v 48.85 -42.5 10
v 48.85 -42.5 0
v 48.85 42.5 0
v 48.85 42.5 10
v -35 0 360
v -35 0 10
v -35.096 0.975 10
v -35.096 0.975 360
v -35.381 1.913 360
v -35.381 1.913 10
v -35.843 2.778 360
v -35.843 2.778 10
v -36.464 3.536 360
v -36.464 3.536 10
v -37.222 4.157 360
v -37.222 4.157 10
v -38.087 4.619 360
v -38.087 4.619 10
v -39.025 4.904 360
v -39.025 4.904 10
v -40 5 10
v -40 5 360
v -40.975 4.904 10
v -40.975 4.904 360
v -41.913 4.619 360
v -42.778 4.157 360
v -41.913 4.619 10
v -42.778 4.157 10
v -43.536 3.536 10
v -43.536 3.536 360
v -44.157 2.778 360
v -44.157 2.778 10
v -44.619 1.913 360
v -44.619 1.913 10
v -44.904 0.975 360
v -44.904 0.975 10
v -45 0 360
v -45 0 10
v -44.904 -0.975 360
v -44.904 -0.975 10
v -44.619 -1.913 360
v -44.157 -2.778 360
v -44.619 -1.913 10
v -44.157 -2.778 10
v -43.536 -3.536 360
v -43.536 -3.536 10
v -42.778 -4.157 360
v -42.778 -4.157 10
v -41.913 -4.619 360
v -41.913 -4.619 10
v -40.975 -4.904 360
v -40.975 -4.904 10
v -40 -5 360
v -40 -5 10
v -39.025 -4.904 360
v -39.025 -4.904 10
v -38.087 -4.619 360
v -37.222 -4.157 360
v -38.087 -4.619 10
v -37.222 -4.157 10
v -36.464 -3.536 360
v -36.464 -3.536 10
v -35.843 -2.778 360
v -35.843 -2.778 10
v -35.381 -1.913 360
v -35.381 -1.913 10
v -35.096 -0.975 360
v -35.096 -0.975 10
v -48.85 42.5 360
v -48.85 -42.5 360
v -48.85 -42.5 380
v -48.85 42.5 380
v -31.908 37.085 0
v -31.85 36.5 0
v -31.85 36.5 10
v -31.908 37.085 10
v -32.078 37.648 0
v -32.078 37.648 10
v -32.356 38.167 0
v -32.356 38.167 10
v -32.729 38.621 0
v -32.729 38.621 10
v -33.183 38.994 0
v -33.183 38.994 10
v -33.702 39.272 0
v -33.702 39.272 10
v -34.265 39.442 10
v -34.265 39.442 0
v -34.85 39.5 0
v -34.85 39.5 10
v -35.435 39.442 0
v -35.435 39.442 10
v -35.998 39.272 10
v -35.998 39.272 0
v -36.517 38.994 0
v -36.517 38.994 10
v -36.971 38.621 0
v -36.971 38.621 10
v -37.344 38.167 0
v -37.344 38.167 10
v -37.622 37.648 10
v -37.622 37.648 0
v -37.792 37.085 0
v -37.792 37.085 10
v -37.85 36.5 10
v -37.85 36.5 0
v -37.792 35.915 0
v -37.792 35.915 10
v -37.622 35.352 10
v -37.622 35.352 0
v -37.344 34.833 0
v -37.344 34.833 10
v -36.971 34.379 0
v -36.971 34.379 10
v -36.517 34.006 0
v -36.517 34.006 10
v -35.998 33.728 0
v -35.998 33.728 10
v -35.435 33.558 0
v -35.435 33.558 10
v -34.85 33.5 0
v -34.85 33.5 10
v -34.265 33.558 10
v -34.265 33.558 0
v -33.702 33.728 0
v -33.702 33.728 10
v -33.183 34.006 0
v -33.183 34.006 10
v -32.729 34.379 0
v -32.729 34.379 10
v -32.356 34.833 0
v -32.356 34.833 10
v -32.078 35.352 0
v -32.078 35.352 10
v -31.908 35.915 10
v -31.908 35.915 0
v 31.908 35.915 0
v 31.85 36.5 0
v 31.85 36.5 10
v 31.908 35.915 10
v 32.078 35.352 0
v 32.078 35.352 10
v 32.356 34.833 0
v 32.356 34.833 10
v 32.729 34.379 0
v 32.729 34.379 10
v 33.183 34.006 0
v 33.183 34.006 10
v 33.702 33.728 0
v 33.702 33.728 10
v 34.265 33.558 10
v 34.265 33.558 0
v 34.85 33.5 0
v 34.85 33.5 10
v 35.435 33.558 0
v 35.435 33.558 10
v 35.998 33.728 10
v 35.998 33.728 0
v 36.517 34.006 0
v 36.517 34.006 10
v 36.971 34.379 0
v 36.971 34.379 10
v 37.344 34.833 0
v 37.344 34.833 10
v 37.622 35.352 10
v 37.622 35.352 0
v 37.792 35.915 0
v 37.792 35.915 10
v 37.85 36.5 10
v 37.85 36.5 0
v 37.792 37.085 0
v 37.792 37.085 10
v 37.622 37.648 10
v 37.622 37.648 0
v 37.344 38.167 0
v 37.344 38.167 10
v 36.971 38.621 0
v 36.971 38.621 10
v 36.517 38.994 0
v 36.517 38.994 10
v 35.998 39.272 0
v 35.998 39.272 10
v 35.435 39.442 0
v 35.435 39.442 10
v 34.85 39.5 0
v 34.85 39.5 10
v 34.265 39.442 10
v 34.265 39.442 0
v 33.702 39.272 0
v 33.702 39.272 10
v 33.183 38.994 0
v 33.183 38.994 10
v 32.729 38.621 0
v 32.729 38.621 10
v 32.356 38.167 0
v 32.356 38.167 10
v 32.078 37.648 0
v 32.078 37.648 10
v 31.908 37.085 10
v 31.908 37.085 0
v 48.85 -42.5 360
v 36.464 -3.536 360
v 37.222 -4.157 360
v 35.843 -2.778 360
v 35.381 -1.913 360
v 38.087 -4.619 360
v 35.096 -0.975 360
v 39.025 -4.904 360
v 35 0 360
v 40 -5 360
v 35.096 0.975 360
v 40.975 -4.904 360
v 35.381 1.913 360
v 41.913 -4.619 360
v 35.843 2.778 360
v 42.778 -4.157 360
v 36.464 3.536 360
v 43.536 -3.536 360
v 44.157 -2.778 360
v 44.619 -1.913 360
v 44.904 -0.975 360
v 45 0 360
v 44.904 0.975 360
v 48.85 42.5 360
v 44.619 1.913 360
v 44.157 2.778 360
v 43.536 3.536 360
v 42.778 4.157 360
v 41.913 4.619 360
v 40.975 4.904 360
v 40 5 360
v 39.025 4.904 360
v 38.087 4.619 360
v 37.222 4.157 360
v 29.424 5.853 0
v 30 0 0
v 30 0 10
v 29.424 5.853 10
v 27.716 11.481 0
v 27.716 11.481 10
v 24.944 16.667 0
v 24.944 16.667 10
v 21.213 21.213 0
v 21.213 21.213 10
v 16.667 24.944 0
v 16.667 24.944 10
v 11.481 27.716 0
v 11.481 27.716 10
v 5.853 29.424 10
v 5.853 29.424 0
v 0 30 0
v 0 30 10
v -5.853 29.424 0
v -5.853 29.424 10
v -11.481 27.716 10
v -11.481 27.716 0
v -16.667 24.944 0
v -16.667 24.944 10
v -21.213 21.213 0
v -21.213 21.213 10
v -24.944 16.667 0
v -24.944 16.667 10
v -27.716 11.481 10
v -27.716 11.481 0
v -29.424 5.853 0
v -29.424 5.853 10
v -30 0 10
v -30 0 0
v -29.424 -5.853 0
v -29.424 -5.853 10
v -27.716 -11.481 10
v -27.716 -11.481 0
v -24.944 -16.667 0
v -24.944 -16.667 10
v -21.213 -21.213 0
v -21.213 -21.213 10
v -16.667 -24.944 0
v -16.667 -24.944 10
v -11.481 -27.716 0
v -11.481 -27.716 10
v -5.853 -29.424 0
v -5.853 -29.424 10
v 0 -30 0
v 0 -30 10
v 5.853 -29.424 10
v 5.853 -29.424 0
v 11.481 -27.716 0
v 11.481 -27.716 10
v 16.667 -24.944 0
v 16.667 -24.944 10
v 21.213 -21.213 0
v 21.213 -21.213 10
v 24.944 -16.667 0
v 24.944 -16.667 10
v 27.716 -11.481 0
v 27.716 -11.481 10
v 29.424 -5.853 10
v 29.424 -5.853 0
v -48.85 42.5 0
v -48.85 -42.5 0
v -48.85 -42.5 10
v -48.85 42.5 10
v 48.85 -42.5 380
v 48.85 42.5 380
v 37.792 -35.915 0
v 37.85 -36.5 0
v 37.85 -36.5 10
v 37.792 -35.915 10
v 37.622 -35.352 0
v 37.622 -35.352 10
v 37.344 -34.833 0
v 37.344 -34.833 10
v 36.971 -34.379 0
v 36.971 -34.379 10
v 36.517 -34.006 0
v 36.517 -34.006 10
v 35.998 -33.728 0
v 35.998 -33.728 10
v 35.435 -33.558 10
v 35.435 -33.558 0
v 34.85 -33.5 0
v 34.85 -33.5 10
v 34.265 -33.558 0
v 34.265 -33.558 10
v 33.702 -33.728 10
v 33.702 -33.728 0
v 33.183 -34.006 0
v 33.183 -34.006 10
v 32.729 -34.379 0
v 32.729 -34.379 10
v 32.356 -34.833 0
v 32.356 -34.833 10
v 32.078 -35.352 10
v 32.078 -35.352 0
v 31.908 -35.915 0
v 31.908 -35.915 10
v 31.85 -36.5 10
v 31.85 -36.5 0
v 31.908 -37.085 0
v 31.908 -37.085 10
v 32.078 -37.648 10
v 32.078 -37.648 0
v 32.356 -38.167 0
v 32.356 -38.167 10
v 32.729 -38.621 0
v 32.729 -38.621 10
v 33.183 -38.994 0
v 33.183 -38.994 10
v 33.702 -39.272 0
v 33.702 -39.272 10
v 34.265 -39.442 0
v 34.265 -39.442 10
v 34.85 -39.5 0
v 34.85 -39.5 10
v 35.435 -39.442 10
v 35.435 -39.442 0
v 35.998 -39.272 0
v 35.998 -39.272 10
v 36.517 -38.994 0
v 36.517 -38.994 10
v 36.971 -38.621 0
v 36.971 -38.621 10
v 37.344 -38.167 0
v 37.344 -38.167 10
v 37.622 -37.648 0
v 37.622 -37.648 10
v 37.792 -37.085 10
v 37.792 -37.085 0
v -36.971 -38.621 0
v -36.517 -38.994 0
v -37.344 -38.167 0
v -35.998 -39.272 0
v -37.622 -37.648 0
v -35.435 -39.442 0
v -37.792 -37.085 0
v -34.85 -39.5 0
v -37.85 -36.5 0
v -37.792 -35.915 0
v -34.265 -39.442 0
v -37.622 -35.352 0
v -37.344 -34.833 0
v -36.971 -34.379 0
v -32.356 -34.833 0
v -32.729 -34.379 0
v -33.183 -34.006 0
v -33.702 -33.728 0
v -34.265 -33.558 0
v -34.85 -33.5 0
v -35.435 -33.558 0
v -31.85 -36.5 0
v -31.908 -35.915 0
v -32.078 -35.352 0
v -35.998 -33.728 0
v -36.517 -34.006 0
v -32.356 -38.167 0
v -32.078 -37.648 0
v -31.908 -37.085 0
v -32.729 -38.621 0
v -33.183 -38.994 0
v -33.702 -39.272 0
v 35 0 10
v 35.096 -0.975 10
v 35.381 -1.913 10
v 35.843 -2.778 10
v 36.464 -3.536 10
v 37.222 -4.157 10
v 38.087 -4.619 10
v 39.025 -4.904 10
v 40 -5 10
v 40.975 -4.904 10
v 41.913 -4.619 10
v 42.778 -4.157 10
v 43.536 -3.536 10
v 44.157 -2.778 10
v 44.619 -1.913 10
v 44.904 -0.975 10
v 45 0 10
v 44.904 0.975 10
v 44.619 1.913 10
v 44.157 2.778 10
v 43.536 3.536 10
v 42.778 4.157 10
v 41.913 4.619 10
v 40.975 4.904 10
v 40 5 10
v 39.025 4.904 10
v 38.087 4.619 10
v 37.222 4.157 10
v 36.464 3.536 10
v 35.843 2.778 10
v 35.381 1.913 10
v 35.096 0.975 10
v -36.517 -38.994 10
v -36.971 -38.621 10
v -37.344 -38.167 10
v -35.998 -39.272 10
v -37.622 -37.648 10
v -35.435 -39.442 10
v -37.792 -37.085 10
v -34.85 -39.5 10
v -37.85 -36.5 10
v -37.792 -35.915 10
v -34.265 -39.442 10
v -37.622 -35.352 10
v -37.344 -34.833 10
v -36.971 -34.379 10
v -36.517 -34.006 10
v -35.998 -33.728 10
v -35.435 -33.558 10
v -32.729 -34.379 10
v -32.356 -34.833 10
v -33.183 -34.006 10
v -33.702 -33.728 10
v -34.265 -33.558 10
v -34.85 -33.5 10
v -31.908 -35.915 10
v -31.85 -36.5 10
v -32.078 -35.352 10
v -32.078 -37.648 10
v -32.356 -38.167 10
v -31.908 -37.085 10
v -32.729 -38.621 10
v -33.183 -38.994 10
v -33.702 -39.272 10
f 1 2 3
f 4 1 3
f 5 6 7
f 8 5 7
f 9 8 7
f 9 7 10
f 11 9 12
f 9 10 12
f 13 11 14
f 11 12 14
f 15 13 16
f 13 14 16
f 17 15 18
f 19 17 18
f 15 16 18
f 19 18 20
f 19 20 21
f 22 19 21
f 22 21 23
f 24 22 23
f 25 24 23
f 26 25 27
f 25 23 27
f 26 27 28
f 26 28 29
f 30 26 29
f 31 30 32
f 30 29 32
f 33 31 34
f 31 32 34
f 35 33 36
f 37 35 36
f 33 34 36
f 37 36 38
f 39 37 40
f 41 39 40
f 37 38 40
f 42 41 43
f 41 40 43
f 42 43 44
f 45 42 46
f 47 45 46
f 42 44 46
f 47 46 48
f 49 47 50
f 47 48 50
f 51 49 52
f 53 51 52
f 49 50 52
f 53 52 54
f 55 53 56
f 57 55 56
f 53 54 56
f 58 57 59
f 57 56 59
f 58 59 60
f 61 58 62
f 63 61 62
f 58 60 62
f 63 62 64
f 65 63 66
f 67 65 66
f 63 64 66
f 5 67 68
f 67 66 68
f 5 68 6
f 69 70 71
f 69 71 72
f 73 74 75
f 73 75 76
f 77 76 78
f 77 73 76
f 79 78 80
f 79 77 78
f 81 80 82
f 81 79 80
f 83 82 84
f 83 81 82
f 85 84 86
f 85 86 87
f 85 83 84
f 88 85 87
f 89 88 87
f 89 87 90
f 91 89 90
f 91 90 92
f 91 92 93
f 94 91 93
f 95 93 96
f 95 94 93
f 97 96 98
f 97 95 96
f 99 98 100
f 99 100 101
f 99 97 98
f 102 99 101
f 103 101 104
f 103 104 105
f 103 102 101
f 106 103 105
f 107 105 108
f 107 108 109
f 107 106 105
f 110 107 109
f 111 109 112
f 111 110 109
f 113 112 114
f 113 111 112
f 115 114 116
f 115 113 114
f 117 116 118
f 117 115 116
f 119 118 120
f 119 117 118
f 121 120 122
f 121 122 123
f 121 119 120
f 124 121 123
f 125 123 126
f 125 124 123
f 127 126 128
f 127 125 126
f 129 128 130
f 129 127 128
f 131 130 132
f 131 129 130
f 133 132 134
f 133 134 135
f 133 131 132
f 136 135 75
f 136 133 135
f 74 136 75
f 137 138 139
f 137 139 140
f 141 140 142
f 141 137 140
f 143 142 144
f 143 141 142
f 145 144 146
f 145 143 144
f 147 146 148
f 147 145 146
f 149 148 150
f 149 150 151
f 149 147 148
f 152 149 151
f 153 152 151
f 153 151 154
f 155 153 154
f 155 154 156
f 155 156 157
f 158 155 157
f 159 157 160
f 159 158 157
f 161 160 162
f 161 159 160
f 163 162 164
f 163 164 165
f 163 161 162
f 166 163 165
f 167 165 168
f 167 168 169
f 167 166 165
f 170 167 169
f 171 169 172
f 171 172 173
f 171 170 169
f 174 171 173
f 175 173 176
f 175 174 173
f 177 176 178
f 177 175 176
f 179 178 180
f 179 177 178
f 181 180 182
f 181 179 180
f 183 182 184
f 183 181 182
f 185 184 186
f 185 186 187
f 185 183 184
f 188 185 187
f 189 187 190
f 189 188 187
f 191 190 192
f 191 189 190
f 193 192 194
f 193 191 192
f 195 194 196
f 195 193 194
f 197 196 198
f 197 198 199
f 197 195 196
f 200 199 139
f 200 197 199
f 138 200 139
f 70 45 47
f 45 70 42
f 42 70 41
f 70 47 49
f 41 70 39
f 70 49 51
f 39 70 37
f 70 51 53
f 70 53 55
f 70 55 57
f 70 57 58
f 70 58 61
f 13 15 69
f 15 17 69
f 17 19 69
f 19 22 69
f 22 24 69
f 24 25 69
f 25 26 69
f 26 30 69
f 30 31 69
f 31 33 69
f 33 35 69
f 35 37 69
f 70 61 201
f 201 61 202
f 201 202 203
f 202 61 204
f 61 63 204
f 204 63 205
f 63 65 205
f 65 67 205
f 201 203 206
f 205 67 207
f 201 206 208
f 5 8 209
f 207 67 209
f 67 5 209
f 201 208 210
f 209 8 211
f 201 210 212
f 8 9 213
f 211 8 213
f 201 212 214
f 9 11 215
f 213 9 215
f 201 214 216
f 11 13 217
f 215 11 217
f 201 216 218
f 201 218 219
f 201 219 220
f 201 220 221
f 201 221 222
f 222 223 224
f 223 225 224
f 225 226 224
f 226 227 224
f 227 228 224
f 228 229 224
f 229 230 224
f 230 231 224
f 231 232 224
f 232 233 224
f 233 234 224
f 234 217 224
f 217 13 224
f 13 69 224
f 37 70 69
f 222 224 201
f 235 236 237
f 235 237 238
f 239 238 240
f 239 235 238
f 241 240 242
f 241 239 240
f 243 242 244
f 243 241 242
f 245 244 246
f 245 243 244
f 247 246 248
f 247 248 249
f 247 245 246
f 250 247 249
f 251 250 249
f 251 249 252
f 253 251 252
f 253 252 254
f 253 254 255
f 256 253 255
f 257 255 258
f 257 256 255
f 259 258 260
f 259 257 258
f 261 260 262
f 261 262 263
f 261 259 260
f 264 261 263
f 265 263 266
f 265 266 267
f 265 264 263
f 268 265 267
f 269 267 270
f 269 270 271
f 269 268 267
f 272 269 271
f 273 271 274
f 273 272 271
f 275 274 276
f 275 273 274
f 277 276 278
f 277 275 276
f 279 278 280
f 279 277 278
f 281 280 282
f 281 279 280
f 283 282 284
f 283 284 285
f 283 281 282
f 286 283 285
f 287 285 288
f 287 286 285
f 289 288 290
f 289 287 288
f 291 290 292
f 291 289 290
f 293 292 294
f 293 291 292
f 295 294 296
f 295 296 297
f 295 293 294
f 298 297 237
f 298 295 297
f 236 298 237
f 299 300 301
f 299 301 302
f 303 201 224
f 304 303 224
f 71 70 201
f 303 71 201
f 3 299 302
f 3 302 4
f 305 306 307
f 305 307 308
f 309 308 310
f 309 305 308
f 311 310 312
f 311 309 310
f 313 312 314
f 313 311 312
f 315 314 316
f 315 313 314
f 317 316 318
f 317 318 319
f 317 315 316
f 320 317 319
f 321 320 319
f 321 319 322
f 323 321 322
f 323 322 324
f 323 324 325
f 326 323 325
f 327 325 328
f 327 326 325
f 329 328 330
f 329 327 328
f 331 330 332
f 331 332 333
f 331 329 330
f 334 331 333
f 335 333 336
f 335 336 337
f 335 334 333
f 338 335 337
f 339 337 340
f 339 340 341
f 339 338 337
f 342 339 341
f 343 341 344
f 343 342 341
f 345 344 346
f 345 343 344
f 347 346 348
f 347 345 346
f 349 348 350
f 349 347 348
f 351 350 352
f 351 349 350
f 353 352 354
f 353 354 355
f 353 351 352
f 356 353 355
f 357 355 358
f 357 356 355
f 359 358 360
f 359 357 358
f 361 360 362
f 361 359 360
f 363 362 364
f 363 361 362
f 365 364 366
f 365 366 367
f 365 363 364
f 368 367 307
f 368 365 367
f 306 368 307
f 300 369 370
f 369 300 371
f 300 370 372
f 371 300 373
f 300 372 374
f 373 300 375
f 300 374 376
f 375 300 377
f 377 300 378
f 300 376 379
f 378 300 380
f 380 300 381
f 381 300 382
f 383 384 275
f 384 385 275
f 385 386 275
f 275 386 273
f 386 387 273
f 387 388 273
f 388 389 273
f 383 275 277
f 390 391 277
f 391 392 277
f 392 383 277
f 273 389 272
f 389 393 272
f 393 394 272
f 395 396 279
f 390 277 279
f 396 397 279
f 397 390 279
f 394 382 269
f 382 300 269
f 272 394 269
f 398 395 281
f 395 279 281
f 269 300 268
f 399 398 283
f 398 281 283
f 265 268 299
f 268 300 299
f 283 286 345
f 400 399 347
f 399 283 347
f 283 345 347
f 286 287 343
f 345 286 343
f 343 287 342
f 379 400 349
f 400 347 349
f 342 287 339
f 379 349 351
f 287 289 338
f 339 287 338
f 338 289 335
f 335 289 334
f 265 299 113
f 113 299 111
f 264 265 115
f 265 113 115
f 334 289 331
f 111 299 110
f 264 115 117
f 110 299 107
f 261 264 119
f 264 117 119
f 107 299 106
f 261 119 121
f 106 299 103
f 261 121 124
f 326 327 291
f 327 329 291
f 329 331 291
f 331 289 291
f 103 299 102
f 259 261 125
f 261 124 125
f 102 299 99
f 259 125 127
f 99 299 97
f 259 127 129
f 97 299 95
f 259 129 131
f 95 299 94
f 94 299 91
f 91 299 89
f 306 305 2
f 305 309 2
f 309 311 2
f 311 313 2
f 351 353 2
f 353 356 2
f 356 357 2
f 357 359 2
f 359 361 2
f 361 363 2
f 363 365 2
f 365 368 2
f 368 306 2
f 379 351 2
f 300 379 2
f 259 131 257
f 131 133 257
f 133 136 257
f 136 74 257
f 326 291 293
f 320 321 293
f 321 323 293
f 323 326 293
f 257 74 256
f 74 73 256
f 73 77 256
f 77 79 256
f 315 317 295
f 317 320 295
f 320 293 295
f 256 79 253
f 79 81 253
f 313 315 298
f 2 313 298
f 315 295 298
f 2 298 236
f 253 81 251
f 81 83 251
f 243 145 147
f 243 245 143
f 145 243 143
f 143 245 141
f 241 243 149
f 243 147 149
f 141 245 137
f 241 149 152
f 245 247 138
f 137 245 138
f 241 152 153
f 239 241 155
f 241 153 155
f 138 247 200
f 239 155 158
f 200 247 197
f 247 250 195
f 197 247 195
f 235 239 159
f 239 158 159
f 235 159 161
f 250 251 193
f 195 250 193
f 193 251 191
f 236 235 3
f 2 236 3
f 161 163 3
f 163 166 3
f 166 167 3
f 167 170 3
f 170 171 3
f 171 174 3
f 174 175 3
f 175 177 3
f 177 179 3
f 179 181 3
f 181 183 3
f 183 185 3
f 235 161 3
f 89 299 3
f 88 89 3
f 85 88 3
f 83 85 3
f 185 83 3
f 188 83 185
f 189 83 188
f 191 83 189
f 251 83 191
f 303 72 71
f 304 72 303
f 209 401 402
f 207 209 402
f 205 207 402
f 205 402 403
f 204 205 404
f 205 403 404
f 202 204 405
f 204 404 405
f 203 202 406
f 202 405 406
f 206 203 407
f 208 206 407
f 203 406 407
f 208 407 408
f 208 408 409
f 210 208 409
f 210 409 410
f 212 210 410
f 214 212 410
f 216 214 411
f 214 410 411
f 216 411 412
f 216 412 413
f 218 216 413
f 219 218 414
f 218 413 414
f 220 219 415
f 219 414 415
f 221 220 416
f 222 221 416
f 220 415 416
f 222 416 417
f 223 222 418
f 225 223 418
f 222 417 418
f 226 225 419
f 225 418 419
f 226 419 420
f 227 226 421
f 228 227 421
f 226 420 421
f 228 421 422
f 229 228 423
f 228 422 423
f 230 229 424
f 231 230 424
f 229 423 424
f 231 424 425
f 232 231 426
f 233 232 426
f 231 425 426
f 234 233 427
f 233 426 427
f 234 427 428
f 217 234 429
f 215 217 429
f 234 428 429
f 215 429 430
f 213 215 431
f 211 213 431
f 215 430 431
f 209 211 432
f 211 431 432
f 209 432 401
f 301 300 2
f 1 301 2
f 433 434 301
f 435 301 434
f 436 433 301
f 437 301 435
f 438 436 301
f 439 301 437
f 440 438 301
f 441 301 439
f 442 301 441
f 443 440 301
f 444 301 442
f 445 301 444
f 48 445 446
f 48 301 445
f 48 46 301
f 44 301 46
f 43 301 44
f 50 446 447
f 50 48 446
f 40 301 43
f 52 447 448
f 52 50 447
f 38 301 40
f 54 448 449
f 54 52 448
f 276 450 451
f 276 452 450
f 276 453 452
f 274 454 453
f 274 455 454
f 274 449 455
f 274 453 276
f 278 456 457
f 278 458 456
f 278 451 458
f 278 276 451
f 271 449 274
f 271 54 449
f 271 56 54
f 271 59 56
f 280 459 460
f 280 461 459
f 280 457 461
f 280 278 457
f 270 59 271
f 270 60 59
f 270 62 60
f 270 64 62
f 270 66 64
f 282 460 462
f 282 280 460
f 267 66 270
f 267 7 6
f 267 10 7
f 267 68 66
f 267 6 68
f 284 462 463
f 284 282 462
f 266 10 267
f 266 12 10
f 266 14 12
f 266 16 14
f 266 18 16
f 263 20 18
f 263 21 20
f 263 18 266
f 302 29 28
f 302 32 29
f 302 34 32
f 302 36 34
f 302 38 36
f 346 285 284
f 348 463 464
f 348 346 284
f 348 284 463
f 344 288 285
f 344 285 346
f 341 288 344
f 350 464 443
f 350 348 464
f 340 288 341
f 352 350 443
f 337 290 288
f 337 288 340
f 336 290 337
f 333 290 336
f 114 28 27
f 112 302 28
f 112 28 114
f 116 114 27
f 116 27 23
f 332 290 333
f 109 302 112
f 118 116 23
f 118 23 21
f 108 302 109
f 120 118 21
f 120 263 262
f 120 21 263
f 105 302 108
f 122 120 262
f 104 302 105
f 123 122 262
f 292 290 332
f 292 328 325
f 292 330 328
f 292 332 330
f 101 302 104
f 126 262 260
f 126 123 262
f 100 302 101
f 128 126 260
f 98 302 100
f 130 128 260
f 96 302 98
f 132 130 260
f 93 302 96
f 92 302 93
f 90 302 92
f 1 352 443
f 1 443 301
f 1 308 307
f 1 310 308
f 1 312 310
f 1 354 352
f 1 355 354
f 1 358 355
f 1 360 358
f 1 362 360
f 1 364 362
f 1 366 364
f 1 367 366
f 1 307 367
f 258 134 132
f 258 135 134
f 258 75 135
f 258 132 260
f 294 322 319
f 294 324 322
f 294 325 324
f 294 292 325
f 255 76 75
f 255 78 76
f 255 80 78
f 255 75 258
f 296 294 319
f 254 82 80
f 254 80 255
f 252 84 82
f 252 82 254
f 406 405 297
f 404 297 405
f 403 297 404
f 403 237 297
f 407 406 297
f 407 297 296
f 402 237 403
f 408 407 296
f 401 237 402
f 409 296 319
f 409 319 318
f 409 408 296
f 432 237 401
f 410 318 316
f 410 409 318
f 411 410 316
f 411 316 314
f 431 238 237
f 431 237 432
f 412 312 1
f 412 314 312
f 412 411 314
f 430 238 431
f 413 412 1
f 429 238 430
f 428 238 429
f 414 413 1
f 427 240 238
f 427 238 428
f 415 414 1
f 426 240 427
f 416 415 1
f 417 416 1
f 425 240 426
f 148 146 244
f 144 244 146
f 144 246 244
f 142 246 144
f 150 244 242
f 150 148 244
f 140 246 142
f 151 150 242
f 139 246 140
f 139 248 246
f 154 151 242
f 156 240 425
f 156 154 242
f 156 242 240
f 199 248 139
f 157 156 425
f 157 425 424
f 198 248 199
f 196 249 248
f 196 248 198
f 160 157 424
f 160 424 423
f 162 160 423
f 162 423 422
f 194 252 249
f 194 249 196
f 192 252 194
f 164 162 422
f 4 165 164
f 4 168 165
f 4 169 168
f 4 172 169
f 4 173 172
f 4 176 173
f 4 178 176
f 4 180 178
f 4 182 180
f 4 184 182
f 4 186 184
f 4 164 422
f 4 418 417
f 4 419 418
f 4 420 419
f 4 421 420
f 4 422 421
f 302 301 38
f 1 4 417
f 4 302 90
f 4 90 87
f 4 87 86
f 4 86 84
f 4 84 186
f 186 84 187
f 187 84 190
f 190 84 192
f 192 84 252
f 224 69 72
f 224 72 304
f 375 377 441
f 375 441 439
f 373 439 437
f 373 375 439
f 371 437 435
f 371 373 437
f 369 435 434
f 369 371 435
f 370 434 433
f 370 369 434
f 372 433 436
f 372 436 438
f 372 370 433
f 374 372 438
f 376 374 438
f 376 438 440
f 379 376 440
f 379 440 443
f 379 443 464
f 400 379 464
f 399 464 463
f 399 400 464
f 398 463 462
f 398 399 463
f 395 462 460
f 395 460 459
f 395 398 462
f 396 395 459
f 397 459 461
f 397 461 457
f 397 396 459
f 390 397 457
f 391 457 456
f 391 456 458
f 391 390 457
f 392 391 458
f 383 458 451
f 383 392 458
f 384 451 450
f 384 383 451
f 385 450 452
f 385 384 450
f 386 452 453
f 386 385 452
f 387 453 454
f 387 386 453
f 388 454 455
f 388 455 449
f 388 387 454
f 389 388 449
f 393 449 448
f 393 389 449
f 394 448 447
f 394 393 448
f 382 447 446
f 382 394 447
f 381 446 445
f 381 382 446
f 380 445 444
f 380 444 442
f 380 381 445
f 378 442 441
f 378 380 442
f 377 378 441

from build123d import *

# Parameters (mm, degrees)
CROQUIS1_W              = 97.7
CROQUIS1_H              = 85
CROQUIS1_R              = 3
CROQUIS1_R_2            = 30
SALIENTE_EXTRUIR1_DEPTH = 10
CROQUIS2_R              = 5
SALIENTE_EXTRUIR2_DEPTH = 350
CROQUIS3_W              = 97.7
CROQUIS3_H              = 85
SALIENTE_EXTRUIR3_DEPTH = 20


with BuildPart() as part:
    # Croquis1 → Saliente-Extruir1 (new body)
    with BuildSketch(Plane.XY):
        Rectangle(CROQUIS1_W, CROQUIS1_H)
        with Locations((-34.85, 36.5)):
            Circle(CROQUIS1_R, mode=Mode.SUBTRACT)
        Circle(CROQUIS1_R_2, mode=Mode.SUBTRACT)
        with Locations(Location((34.85, 36.5, 0), (0, 0, 180))):
            Circle(CROQUIS1_R, mode=Mode.SUBTRACT)
        with Locations((34.85, -36.5)):
            Circle(CROQUIS1_R, mode=Mode.SUBTRACT)
        with Locations(Location((-34.85, -36.5, 0), (0, 0, 180))):
            Circle(CROQUIS1_R, mode=Mode.SUBTRACT)
    extrude(amount=SALIENTE_EXTRUIR1_DEPTH)

    # Croquis2 → Saliente-Extruir2 (add)
    with BuildSketch(Plane.XY.offset(10)):
        with Locations((-40, 0)):
            Circle(CROQUIS2_R)
        with Locations(Location((40, 0, 0), (0, 0, 180))):
            Circle(CROQUIS2_R)
    extrude(amount=SALIENTE_EXTRUIR2_DEPTH)

    # Croquis3 → Saliente-Extruir3 (add)
    with BuildSketch(Plane.XY.offset(360)):
        Rectangle(CROQUIS3_W, CROQUIS3_H)
    extrude(amount=SALIENTE_EXTRUIR3_DEPTH)


solid = part.part
